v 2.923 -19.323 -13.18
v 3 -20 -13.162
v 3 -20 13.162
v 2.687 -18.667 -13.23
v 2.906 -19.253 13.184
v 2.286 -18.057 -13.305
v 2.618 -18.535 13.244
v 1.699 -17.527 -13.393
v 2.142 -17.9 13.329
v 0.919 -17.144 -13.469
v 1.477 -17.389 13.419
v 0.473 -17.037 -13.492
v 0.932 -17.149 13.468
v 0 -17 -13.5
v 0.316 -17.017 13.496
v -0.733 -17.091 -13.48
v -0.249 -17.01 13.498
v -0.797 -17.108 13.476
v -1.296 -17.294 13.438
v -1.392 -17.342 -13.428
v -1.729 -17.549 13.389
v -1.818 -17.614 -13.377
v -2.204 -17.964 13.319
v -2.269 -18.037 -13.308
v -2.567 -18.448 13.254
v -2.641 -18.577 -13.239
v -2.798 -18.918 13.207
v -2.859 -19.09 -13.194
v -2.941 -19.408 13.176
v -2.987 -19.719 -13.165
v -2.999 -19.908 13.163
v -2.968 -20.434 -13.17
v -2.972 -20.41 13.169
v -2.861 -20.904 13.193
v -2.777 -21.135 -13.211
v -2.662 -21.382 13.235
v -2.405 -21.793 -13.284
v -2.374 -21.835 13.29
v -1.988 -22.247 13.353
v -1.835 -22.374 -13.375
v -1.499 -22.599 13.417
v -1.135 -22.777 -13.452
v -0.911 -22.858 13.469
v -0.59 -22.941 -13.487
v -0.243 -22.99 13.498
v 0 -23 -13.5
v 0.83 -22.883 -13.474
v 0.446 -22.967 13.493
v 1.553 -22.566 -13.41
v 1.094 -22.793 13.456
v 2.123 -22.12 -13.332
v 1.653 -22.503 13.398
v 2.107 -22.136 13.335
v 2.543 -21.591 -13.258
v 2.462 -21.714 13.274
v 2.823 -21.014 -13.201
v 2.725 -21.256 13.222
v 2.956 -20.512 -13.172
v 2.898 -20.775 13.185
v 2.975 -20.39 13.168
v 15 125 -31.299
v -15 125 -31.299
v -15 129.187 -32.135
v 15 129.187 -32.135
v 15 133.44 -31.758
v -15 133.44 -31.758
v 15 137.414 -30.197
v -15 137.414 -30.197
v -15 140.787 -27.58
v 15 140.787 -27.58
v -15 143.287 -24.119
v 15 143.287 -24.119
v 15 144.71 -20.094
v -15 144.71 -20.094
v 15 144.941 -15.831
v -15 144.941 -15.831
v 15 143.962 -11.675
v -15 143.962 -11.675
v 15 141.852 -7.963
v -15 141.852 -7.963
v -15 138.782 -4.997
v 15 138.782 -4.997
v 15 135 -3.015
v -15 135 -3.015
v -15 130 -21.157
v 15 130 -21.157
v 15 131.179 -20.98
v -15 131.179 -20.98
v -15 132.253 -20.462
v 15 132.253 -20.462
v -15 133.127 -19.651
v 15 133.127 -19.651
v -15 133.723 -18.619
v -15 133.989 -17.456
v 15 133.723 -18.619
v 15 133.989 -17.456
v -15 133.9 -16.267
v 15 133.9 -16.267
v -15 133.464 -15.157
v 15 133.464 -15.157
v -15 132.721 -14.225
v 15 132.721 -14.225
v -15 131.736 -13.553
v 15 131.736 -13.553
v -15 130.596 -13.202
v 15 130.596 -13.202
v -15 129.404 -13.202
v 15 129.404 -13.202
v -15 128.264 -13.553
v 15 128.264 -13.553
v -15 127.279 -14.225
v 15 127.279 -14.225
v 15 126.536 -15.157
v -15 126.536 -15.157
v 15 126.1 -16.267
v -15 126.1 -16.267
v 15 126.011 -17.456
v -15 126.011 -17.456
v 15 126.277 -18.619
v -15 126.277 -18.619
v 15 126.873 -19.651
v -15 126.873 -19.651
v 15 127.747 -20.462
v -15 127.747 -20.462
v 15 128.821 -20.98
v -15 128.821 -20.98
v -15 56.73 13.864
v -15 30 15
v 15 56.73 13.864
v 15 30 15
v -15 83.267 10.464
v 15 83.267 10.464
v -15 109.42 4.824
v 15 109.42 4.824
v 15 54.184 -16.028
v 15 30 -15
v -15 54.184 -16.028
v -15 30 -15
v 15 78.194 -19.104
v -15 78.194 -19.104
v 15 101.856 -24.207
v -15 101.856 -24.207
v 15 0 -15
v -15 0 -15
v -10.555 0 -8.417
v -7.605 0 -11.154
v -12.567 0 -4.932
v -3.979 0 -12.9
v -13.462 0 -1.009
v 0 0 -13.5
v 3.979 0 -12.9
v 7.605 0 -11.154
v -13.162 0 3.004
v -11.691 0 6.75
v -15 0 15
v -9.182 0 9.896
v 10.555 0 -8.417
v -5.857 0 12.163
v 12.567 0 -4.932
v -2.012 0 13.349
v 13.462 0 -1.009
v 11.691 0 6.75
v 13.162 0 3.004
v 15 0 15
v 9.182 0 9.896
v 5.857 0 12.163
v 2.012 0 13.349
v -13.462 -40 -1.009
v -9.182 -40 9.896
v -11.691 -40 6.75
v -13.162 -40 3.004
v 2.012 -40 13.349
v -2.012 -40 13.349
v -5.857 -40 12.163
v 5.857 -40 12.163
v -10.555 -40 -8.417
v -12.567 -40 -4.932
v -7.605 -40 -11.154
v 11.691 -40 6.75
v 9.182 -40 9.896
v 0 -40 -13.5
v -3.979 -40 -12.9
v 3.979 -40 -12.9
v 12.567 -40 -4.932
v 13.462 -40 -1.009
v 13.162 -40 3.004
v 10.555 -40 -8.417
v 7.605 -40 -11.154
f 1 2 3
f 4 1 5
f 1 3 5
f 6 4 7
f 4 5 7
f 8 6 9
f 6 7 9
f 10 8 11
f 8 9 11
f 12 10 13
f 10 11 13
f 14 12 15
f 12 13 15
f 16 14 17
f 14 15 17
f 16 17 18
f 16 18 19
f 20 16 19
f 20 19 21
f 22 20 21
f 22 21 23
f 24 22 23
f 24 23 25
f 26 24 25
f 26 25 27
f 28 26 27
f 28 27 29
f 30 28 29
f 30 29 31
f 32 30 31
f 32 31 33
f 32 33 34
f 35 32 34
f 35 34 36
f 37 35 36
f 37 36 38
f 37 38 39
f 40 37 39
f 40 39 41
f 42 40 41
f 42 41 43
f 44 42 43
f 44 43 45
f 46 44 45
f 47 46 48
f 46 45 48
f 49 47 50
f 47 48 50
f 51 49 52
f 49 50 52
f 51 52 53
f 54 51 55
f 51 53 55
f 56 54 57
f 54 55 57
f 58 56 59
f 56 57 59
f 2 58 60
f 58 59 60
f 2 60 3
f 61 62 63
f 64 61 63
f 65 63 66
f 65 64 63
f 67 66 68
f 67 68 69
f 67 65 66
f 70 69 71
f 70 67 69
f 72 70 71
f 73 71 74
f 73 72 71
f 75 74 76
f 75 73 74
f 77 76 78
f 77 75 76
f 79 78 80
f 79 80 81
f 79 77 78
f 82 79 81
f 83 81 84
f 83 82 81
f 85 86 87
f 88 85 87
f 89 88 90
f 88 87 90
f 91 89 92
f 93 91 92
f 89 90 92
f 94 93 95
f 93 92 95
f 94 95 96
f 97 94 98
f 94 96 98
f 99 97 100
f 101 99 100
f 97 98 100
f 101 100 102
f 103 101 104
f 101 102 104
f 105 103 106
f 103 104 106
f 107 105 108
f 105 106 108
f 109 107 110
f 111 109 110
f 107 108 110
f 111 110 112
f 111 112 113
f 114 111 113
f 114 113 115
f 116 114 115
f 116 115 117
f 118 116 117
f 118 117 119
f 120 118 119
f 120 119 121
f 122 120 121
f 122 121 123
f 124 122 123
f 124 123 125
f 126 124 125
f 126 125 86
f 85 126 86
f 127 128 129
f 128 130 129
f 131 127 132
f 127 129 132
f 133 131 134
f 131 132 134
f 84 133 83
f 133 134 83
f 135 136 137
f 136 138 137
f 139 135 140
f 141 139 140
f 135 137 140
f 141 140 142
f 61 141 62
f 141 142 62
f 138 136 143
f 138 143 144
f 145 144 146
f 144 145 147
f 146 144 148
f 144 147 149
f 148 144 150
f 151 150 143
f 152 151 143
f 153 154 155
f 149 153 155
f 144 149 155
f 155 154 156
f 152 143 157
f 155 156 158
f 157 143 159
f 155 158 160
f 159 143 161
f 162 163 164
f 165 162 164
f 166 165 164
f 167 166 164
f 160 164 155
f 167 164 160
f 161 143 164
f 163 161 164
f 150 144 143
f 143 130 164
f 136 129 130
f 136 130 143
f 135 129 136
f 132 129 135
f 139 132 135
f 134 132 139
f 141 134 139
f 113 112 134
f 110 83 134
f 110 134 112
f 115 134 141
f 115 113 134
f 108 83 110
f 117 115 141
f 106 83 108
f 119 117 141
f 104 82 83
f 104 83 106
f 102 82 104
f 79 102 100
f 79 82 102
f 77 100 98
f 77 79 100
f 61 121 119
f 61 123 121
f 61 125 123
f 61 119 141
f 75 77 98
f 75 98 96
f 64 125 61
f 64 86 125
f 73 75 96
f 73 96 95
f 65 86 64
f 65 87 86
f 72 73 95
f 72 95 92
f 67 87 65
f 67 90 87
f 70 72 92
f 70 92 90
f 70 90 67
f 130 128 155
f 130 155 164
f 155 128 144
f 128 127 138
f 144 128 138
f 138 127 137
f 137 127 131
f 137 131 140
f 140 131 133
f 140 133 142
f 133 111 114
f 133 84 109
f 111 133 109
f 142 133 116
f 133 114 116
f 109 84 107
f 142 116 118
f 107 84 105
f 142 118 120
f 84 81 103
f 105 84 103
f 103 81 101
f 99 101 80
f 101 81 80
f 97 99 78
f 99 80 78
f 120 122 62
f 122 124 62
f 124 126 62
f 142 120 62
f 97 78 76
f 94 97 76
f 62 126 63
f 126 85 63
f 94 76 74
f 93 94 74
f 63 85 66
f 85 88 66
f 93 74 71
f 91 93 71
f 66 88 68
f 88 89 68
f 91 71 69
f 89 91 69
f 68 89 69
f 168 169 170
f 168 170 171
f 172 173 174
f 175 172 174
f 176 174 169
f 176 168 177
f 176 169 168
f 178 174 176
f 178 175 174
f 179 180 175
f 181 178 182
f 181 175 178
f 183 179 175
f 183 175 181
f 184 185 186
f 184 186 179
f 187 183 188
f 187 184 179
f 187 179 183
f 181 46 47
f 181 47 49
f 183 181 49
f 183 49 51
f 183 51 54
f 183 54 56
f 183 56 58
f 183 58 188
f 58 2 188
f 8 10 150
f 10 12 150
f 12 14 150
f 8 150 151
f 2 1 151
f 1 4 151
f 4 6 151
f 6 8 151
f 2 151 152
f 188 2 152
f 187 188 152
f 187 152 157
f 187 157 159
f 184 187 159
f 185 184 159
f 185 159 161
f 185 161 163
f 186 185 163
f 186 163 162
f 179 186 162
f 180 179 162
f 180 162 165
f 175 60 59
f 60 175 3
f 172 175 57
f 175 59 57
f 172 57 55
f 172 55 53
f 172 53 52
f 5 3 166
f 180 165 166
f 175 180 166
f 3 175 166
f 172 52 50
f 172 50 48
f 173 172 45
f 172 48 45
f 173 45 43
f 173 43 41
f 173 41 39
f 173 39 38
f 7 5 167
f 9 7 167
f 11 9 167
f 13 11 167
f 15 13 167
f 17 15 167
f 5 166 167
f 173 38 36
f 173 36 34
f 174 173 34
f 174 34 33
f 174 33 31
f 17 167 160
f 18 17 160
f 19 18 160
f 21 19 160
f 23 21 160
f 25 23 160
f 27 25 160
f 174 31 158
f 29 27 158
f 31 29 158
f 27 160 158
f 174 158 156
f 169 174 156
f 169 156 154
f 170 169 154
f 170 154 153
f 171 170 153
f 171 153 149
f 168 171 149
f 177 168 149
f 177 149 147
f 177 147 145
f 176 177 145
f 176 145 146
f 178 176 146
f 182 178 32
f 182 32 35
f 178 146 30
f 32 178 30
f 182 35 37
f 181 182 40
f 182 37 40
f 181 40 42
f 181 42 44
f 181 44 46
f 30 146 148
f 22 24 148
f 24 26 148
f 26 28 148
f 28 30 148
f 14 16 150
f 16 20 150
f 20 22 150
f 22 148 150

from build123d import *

# Parameters (mm, degrees)
SKETCH2_W           = 30
SKETCH2_H           = 30
SKETCH3_R           = 13.5
BOSS_EXTRUDE1_DEPTH = 40
BOSS_EXTRUDE2_DEPTH = 30
CUT_EXTRUDE1_REACH  = 153.523
SKETCH5_R           = 4
CUT_EXTRUDE2_REACH  = 155.212
SKETCH6_R           = 3


with BuildPart() as part:
    # Sweep1: sweep along a path in Sketch1
    with BuildLine(Plane(origin=(0, 0, 0), x_dir=(0, 0, -1), z_dir=(1, 0, 0))) as sweep1_path:
        Line((0, 0), (0, 30))
        ThreePointArc((0, 30), (4.320432104, 80.730593618), (17.157287525, 130))
    # Sketch2 → Sweep1 (sweep)
    with BuildSketch(Plane(origin=(0, 0, 0), x_dir=(1, 0, 0), z_dir=(0, 1, 0))):
        Rectangle(SKETCH2_W, SKETCH2_H)
    sweep(path=sweep1_path.line)

    # Sketch3 → Boss-Extrude1 (add)
    with BuildSketch(Plane.XZ):
        with Locations(Location((0, 0, 0), (0, 0, 270))):
            Circle(SKETCH3_R)
    extrude(amount=BOSS_EXTRUDE1_DEPTH)

    # Sketch4 → Boss-Extrude2 (add)
    with BuildSketch(Plane(origin=(15, 0, 0), x_dir=(0, 0, -1), z_dir=(1, 0, 0))):
        with BuildLine():
            Line((3.015151902, 135), (31.299423149, 125))
            ThreePointArc((31.299423149, 125), (22.157287525, 144.142135624), (3.015151902, 135))
        make_face()
    extrude(amount=-BOSS_EXTRUDE2_DEPTH)

    # Sketch5 → Cut-Extrude1 (cut, up to next)
    with BuildSketch(Plane(origin=(15, 0, 0), x_dir=(0, 0, -1), z_dir=(1, 0, 0)), mode=Mode.PRIVATE) as cut_extrude1_sk1:
        with Locations((17.157287525, 130)):
            Circle(SKETCH5_R)
    cut_extrude1_tool1 = extrude(cut_extrude1_sk1.sketch, amount=-CUT_EXTRUDE1_REACH, mode=Mode.PRIVATE) & part.part
    add(cut_extrude1_tool1.solids().sort_by_distance((15, 130, -17.157288))[0], mode=Mode.SUBTRACT)

    # Sketch6 → Cut-Extrude2 (cut, up to next)
    with BuildSketch(Plane.XY.offset(15), mode=Mode.PRIVATE) as cut_extrude2_sk1:
        with Locations((0, -20)):
            Circle(SKETCH6_R)
    cut_extrude2_tool1 = extrude(cut_extrude2_sk1.sketch, amount=-CUT_EXTRUDE2_REACH, mode=Mode.PRIVATE) & part.part
    add(cut_extrude2_tool1.solids().sort_by_distance((0, -20, 15))[0], mode=Mode.SUBTRACT)


solid = part.part
